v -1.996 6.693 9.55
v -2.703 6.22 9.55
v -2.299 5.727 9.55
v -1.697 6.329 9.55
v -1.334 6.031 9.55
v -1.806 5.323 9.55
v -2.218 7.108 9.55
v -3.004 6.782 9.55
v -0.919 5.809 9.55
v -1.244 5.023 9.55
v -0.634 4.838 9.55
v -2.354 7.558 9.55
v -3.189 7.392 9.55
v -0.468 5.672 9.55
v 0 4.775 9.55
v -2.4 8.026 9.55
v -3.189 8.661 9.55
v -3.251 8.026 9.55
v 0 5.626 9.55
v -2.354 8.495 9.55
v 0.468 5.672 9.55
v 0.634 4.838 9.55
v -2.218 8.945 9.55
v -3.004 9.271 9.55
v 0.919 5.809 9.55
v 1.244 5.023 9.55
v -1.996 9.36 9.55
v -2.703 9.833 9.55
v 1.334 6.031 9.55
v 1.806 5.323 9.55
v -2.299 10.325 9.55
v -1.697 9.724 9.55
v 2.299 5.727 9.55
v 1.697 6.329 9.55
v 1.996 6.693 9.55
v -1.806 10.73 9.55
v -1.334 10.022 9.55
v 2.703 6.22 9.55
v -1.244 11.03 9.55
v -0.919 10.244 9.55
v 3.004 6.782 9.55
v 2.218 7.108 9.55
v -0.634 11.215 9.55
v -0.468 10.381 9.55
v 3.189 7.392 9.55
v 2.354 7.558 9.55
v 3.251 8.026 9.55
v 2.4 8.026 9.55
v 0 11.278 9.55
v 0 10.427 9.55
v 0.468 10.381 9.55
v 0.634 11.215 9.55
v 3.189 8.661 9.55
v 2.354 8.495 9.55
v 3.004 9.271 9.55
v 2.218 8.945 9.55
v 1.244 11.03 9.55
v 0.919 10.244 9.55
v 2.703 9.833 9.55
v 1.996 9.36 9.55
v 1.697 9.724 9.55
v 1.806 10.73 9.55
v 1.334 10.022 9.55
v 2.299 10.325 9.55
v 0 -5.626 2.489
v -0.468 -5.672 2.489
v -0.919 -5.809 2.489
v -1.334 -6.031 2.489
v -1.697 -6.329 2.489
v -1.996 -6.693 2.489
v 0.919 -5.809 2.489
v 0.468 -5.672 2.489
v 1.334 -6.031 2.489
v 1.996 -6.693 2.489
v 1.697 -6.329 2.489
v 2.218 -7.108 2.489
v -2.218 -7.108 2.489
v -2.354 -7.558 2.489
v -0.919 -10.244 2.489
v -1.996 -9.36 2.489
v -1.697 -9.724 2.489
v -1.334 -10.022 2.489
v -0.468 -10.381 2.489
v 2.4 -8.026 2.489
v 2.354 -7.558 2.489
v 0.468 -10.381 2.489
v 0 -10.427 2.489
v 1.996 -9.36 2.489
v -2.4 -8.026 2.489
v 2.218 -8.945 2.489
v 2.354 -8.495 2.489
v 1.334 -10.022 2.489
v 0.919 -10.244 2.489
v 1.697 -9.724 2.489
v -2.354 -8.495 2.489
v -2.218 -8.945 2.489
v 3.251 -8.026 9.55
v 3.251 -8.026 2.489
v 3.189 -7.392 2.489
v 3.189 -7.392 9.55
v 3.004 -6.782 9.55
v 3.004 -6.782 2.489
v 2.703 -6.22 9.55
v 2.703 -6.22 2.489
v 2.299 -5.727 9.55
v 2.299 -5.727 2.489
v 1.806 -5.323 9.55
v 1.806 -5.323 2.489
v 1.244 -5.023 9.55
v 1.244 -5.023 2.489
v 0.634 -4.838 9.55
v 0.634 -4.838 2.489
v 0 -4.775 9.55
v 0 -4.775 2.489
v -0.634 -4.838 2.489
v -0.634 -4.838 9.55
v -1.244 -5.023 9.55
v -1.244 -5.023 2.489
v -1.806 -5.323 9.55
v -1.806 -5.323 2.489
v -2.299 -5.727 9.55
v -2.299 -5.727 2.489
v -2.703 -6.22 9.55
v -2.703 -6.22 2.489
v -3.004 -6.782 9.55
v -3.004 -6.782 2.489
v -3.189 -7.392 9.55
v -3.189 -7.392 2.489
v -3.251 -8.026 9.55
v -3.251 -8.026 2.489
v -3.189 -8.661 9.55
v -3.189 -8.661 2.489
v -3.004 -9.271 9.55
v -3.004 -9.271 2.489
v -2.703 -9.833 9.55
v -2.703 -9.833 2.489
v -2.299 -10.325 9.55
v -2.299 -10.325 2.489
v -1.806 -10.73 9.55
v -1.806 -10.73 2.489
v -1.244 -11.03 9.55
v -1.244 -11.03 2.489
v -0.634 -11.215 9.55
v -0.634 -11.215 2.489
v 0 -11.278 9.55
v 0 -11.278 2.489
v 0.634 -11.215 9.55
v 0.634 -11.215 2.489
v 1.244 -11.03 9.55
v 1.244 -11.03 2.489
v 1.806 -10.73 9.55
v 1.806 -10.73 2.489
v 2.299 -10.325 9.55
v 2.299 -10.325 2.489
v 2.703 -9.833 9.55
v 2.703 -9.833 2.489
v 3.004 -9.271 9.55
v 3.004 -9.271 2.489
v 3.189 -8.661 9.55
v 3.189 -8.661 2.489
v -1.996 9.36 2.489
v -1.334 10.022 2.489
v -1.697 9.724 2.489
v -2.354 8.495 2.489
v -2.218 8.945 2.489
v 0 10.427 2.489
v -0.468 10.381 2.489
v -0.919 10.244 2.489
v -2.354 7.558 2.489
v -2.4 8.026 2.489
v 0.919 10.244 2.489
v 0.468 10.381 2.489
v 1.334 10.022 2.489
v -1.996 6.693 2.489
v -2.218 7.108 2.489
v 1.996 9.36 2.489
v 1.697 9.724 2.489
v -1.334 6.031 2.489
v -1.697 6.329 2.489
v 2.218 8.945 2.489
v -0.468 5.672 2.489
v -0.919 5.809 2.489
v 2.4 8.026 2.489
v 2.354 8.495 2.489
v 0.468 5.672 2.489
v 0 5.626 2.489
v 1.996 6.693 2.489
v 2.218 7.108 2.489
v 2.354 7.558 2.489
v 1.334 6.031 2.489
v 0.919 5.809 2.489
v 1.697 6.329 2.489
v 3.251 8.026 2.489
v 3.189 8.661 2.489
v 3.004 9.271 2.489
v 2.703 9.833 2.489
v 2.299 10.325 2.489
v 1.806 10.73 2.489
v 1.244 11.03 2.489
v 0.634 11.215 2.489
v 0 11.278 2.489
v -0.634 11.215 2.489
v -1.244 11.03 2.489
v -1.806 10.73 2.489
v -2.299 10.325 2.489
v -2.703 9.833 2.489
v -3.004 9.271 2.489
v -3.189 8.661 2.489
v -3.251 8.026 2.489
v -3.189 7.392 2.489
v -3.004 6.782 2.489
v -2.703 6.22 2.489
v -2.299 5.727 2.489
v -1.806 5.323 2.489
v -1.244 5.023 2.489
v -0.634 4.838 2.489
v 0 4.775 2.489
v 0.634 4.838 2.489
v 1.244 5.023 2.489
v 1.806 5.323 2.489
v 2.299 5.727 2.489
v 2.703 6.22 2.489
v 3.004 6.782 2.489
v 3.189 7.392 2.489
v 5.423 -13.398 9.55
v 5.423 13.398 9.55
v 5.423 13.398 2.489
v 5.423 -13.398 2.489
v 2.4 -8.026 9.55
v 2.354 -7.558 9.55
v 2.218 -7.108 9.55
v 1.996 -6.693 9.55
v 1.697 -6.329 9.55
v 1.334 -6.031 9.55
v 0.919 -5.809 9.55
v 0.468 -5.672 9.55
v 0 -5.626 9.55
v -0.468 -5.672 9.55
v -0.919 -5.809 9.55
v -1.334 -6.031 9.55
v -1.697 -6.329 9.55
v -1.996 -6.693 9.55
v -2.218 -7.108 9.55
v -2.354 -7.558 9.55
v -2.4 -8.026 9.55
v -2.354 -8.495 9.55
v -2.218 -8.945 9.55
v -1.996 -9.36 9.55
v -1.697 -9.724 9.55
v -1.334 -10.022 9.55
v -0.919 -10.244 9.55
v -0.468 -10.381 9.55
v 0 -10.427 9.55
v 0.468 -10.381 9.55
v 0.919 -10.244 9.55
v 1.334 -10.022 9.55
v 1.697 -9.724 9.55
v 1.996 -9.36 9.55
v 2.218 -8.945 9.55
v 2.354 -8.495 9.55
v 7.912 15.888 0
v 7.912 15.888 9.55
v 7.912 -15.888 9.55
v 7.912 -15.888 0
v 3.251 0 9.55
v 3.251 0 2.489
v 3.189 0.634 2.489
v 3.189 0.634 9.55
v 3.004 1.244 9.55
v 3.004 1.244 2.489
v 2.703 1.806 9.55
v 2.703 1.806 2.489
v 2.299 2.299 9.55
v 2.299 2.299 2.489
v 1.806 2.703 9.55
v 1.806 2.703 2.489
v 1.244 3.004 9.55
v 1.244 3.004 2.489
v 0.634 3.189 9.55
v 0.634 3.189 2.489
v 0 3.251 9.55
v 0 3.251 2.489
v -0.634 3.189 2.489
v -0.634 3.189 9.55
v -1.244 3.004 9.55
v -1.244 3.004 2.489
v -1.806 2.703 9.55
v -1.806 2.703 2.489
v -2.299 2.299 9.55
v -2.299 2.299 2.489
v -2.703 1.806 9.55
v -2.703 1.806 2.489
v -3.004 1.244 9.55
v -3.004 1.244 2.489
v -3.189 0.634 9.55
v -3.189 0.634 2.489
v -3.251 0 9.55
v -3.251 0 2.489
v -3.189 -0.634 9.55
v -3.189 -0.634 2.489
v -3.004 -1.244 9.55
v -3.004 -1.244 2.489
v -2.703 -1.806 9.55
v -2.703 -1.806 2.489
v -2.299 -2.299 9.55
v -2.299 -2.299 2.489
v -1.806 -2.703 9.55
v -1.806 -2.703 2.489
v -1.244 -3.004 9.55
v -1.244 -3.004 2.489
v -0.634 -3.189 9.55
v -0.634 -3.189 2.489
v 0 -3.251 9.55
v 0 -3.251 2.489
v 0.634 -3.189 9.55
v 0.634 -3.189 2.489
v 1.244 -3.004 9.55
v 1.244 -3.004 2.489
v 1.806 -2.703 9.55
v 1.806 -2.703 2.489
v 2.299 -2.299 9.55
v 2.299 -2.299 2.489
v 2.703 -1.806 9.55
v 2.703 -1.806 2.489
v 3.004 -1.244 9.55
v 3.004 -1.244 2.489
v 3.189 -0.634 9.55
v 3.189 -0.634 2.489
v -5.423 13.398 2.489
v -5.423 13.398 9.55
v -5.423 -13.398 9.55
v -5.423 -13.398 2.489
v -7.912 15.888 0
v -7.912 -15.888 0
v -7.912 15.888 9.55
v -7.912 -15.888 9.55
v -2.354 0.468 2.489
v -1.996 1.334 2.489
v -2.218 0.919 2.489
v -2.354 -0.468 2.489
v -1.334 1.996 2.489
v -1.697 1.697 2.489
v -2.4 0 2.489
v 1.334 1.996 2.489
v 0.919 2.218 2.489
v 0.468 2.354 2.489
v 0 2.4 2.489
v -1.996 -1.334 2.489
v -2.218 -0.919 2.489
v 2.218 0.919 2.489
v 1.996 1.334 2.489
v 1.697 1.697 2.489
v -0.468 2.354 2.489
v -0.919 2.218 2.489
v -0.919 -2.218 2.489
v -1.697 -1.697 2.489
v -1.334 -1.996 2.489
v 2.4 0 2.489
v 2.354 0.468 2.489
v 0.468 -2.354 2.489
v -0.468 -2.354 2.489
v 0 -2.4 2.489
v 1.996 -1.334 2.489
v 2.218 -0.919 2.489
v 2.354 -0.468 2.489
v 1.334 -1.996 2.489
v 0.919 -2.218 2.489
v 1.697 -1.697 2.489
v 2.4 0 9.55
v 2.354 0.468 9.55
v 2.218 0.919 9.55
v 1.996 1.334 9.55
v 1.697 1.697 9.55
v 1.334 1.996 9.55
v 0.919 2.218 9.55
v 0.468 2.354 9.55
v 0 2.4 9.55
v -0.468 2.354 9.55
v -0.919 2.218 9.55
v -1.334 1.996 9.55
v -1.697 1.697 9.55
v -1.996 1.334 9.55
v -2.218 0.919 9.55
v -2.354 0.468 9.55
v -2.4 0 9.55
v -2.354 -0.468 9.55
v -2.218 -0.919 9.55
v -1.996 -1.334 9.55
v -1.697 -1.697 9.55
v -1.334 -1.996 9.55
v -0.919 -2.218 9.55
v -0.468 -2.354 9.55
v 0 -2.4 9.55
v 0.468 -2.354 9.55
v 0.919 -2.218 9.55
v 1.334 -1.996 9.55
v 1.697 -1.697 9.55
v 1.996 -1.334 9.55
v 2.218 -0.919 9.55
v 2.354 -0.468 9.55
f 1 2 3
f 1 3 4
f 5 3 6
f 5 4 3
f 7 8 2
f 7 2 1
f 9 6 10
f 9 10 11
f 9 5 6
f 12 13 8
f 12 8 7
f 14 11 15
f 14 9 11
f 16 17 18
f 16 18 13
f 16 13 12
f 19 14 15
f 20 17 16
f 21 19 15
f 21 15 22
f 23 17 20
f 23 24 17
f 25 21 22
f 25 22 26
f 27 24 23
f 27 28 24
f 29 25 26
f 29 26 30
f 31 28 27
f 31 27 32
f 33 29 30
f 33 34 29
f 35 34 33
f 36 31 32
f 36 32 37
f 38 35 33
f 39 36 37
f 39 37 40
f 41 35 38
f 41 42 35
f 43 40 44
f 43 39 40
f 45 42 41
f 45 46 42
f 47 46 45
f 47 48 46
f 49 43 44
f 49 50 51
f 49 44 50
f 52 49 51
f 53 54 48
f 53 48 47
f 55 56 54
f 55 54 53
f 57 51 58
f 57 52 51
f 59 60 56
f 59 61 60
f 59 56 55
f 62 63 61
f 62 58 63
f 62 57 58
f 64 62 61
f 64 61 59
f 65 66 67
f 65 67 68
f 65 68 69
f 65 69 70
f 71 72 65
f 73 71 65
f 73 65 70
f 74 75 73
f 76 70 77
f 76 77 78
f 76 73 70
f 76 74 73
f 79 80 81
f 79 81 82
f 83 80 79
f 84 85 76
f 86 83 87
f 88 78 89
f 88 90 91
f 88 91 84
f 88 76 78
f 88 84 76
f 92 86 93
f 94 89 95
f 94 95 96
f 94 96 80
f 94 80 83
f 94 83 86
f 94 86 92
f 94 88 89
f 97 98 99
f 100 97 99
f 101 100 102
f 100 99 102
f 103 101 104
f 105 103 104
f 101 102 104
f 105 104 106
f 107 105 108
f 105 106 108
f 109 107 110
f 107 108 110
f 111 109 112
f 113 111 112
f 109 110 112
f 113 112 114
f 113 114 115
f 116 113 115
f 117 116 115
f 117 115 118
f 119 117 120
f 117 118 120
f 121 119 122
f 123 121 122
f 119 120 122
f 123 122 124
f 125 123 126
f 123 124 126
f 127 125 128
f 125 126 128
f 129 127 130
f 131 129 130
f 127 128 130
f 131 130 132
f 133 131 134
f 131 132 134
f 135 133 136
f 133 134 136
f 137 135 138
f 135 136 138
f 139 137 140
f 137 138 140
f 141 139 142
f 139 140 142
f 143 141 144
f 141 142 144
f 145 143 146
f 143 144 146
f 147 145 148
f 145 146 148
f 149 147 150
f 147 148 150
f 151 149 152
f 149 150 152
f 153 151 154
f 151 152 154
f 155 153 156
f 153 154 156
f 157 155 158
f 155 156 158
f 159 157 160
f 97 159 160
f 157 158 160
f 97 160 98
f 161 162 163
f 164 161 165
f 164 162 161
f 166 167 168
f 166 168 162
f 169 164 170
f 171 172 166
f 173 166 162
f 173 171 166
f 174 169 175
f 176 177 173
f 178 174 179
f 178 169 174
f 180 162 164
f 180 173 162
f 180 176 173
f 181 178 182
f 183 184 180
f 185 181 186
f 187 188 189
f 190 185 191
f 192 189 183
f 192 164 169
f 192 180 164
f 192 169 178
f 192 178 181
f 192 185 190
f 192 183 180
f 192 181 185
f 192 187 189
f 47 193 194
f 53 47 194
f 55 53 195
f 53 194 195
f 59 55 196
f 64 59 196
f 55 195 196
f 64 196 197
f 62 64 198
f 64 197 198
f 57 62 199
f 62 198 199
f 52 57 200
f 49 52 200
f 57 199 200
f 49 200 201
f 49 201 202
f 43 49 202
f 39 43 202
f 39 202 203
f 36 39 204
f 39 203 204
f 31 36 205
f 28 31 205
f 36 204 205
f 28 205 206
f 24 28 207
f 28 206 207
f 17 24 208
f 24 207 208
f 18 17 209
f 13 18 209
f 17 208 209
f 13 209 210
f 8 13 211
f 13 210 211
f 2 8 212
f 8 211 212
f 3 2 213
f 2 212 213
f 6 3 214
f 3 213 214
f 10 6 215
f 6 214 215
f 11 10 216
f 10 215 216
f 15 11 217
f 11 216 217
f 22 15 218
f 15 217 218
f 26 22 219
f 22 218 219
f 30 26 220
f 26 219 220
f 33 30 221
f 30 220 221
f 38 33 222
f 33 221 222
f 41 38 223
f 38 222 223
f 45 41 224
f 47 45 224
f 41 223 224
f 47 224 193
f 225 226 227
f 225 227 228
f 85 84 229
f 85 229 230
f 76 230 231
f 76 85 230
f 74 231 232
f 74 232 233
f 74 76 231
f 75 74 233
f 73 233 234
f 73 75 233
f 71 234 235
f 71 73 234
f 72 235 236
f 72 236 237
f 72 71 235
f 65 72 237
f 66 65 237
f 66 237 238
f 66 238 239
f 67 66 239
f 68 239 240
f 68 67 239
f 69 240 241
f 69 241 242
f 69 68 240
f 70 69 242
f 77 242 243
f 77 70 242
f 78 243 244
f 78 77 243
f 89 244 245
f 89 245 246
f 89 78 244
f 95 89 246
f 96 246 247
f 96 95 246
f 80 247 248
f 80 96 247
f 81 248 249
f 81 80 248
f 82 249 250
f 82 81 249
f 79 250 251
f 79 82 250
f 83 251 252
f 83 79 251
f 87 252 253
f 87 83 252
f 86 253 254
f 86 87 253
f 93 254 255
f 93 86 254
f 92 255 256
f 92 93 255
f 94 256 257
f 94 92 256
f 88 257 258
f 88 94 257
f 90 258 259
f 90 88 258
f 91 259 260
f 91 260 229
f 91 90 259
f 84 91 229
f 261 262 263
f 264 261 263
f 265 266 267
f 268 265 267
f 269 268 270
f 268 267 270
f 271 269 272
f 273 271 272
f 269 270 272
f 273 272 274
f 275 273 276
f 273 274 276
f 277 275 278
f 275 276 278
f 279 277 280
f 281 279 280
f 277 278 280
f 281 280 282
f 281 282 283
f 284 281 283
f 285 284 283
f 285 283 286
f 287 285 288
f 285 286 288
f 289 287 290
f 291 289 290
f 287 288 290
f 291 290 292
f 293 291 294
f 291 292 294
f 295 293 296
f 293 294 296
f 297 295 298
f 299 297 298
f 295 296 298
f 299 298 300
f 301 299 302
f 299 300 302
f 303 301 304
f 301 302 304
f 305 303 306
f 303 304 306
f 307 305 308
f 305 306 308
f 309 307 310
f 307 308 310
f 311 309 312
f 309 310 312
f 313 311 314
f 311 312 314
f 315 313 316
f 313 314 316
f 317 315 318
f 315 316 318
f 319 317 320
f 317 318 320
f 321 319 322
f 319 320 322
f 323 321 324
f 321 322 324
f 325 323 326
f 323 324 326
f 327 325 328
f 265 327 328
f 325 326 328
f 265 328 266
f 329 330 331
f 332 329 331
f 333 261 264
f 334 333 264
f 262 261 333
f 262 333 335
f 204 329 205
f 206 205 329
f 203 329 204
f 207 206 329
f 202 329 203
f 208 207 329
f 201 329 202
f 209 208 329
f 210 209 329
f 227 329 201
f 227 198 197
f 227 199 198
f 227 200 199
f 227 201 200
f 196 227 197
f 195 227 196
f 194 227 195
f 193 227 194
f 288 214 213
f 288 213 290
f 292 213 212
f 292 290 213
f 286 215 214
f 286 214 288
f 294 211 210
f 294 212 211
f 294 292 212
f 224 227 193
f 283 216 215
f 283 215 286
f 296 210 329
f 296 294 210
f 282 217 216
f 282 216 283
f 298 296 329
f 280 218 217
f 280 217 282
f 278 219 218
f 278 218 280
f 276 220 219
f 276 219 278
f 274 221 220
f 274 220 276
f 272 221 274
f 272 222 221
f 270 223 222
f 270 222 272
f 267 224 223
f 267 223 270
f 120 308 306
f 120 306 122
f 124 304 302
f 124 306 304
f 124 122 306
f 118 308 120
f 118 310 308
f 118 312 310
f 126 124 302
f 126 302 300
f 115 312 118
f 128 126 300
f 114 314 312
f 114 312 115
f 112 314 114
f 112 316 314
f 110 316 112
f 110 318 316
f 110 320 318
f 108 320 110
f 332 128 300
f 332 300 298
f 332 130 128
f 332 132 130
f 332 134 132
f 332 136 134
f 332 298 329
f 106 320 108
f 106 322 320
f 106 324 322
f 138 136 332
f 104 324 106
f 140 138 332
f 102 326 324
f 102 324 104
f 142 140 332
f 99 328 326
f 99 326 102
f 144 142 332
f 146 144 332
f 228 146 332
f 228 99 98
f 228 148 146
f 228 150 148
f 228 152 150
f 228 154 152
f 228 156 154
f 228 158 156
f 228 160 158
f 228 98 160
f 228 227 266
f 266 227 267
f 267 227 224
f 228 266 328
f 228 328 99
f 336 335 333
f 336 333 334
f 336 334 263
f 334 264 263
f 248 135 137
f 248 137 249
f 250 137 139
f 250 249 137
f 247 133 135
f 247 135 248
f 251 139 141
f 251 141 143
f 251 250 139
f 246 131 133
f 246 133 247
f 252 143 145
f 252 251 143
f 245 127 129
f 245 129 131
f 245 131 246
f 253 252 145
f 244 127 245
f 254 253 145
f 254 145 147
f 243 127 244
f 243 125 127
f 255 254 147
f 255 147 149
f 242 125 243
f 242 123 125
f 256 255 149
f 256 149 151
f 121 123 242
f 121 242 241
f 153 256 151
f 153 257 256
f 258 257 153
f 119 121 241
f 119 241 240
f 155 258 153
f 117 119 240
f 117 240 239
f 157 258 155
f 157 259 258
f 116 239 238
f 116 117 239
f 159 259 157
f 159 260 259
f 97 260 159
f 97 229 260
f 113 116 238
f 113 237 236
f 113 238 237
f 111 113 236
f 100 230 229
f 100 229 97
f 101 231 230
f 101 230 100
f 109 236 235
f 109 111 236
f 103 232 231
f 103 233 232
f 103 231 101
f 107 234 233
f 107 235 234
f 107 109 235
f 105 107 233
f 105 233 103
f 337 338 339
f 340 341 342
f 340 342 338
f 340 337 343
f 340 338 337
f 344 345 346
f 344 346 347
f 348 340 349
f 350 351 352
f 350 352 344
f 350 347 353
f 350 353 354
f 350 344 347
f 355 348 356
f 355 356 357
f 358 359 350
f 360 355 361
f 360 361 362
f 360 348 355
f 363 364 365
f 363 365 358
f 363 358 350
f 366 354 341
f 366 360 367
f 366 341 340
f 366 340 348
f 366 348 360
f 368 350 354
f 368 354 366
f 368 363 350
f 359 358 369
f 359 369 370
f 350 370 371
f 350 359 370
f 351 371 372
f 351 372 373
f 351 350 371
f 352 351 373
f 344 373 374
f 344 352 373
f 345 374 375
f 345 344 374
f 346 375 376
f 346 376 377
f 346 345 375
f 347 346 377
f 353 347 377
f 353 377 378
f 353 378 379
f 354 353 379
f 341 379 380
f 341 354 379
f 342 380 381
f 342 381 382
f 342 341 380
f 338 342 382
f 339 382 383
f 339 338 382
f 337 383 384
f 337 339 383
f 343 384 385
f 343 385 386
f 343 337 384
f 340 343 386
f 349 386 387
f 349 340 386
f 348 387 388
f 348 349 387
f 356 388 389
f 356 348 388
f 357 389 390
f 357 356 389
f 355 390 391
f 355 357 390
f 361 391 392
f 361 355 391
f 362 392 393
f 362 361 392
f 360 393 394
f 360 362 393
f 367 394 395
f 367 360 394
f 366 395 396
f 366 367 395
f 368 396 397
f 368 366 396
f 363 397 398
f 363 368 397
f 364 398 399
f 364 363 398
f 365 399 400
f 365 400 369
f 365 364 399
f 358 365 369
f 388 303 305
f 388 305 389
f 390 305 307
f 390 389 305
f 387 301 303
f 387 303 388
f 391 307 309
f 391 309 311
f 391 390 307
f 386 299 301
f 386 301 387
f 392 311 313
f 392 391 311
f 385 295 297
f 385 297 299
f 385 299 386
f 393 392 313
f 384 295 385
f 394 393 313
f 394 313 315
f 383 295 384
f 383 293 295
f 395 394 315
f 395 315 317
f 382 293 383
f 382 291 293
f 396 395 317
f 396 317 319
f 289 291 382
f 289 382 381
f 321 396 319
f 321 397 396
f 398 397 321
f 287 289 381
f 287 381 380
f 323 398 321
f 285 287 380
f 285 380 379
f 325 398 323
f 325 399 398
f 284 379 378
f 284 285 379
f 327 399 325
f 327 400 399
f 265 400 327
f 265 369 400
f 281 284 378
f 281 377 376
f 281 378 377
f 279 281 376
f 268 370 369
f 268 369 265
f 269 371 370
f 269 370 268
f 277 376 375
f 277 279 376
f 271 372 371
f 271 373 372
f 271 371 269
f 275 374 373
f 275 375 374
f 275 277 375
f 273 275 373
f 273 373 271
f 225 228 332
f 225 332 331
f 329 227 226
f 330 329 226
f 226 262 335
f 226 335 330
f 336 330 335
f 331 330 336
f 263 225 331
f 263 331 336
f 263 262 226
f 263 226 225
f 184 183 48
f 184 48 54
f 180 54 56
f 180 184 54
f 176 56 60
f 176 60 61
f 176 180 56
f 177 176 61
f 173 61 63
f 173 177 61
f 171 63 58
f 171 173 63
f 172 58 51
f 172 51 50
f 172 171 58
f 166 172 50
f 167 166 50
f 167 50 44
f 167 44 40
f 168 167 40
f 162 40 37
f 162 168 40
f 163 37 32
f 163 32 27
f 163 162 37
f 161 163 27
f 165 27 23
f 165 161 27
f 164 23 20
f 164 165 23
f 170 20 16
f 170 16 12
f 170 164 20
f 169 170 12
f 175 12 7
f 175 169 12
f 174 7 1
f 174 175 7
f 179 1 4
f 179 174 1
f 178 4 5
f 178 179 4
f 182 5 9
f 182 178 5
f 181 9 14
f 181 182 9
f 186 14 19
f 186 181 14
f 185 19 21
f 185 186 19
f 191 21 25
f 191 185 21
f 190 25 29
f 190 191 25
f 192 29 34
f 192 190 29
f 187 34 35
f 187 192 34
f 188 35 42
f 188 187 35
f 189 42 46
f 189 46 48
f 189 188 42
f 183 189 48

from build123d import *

# Parameters (mm, degrees)
F0_W     = 15.8877
F0_H     = 9.5504
F1_DEPTH = 7.9121
F4_T     = -2.4892
F5_R     = 3.2512
F5_R_2   = 2.4003
F6_DEPTH = 7.0612


with BuildPart() as f1:
    # F0 (on Right) → F1 (new body)
    with BuildSketch(Plane.YZ):
        with Locations((7.94385, 4.7752)):
            Rectangle(F0_W, F0_H)
    extrude(amount=F1_DEPTH)

    # F2: F1 across plane


with BuildPart() as f1_1:
    add(f1.part)
    add(f1.part.mirror(Plane.XZ))

    # F3: F1 across plane


with BuildPart() as f1_2:
    add(f1_1.part)
    add(f1_1.part.mirror(Plane.YZ))

    # F4
    f4_openings = [f1_2.faces().sort_by_distance(p)[0] for p in [
        (0, 0, 9.5504),
    ]]
    offset(amount=F4_T, openings=f4_openings)

    # F5 (on face) → F6 (join, through all)
    with BuildSketch(Plane.XY.offset(2.4892)):
        with Locations((0, -8.0264)):
            Circle(F5_R)
        with Locations((0, -8.0264)):
            Circle(F5_R_2, mode=Mode.SUBTRACT)
        Circle(F5_R)
        Circle(F5_R_2, mode=Mode.SUBTRACT)
        with Locations((0, 8.0264)):
            Circle(F5_R)
        with Locations((0, 8.0264)):
            Circle(F5_R_2, mode=Mode.SUBTRACT)
    extrude(amount=F6_DEPTH)


solid = f1_2.part
